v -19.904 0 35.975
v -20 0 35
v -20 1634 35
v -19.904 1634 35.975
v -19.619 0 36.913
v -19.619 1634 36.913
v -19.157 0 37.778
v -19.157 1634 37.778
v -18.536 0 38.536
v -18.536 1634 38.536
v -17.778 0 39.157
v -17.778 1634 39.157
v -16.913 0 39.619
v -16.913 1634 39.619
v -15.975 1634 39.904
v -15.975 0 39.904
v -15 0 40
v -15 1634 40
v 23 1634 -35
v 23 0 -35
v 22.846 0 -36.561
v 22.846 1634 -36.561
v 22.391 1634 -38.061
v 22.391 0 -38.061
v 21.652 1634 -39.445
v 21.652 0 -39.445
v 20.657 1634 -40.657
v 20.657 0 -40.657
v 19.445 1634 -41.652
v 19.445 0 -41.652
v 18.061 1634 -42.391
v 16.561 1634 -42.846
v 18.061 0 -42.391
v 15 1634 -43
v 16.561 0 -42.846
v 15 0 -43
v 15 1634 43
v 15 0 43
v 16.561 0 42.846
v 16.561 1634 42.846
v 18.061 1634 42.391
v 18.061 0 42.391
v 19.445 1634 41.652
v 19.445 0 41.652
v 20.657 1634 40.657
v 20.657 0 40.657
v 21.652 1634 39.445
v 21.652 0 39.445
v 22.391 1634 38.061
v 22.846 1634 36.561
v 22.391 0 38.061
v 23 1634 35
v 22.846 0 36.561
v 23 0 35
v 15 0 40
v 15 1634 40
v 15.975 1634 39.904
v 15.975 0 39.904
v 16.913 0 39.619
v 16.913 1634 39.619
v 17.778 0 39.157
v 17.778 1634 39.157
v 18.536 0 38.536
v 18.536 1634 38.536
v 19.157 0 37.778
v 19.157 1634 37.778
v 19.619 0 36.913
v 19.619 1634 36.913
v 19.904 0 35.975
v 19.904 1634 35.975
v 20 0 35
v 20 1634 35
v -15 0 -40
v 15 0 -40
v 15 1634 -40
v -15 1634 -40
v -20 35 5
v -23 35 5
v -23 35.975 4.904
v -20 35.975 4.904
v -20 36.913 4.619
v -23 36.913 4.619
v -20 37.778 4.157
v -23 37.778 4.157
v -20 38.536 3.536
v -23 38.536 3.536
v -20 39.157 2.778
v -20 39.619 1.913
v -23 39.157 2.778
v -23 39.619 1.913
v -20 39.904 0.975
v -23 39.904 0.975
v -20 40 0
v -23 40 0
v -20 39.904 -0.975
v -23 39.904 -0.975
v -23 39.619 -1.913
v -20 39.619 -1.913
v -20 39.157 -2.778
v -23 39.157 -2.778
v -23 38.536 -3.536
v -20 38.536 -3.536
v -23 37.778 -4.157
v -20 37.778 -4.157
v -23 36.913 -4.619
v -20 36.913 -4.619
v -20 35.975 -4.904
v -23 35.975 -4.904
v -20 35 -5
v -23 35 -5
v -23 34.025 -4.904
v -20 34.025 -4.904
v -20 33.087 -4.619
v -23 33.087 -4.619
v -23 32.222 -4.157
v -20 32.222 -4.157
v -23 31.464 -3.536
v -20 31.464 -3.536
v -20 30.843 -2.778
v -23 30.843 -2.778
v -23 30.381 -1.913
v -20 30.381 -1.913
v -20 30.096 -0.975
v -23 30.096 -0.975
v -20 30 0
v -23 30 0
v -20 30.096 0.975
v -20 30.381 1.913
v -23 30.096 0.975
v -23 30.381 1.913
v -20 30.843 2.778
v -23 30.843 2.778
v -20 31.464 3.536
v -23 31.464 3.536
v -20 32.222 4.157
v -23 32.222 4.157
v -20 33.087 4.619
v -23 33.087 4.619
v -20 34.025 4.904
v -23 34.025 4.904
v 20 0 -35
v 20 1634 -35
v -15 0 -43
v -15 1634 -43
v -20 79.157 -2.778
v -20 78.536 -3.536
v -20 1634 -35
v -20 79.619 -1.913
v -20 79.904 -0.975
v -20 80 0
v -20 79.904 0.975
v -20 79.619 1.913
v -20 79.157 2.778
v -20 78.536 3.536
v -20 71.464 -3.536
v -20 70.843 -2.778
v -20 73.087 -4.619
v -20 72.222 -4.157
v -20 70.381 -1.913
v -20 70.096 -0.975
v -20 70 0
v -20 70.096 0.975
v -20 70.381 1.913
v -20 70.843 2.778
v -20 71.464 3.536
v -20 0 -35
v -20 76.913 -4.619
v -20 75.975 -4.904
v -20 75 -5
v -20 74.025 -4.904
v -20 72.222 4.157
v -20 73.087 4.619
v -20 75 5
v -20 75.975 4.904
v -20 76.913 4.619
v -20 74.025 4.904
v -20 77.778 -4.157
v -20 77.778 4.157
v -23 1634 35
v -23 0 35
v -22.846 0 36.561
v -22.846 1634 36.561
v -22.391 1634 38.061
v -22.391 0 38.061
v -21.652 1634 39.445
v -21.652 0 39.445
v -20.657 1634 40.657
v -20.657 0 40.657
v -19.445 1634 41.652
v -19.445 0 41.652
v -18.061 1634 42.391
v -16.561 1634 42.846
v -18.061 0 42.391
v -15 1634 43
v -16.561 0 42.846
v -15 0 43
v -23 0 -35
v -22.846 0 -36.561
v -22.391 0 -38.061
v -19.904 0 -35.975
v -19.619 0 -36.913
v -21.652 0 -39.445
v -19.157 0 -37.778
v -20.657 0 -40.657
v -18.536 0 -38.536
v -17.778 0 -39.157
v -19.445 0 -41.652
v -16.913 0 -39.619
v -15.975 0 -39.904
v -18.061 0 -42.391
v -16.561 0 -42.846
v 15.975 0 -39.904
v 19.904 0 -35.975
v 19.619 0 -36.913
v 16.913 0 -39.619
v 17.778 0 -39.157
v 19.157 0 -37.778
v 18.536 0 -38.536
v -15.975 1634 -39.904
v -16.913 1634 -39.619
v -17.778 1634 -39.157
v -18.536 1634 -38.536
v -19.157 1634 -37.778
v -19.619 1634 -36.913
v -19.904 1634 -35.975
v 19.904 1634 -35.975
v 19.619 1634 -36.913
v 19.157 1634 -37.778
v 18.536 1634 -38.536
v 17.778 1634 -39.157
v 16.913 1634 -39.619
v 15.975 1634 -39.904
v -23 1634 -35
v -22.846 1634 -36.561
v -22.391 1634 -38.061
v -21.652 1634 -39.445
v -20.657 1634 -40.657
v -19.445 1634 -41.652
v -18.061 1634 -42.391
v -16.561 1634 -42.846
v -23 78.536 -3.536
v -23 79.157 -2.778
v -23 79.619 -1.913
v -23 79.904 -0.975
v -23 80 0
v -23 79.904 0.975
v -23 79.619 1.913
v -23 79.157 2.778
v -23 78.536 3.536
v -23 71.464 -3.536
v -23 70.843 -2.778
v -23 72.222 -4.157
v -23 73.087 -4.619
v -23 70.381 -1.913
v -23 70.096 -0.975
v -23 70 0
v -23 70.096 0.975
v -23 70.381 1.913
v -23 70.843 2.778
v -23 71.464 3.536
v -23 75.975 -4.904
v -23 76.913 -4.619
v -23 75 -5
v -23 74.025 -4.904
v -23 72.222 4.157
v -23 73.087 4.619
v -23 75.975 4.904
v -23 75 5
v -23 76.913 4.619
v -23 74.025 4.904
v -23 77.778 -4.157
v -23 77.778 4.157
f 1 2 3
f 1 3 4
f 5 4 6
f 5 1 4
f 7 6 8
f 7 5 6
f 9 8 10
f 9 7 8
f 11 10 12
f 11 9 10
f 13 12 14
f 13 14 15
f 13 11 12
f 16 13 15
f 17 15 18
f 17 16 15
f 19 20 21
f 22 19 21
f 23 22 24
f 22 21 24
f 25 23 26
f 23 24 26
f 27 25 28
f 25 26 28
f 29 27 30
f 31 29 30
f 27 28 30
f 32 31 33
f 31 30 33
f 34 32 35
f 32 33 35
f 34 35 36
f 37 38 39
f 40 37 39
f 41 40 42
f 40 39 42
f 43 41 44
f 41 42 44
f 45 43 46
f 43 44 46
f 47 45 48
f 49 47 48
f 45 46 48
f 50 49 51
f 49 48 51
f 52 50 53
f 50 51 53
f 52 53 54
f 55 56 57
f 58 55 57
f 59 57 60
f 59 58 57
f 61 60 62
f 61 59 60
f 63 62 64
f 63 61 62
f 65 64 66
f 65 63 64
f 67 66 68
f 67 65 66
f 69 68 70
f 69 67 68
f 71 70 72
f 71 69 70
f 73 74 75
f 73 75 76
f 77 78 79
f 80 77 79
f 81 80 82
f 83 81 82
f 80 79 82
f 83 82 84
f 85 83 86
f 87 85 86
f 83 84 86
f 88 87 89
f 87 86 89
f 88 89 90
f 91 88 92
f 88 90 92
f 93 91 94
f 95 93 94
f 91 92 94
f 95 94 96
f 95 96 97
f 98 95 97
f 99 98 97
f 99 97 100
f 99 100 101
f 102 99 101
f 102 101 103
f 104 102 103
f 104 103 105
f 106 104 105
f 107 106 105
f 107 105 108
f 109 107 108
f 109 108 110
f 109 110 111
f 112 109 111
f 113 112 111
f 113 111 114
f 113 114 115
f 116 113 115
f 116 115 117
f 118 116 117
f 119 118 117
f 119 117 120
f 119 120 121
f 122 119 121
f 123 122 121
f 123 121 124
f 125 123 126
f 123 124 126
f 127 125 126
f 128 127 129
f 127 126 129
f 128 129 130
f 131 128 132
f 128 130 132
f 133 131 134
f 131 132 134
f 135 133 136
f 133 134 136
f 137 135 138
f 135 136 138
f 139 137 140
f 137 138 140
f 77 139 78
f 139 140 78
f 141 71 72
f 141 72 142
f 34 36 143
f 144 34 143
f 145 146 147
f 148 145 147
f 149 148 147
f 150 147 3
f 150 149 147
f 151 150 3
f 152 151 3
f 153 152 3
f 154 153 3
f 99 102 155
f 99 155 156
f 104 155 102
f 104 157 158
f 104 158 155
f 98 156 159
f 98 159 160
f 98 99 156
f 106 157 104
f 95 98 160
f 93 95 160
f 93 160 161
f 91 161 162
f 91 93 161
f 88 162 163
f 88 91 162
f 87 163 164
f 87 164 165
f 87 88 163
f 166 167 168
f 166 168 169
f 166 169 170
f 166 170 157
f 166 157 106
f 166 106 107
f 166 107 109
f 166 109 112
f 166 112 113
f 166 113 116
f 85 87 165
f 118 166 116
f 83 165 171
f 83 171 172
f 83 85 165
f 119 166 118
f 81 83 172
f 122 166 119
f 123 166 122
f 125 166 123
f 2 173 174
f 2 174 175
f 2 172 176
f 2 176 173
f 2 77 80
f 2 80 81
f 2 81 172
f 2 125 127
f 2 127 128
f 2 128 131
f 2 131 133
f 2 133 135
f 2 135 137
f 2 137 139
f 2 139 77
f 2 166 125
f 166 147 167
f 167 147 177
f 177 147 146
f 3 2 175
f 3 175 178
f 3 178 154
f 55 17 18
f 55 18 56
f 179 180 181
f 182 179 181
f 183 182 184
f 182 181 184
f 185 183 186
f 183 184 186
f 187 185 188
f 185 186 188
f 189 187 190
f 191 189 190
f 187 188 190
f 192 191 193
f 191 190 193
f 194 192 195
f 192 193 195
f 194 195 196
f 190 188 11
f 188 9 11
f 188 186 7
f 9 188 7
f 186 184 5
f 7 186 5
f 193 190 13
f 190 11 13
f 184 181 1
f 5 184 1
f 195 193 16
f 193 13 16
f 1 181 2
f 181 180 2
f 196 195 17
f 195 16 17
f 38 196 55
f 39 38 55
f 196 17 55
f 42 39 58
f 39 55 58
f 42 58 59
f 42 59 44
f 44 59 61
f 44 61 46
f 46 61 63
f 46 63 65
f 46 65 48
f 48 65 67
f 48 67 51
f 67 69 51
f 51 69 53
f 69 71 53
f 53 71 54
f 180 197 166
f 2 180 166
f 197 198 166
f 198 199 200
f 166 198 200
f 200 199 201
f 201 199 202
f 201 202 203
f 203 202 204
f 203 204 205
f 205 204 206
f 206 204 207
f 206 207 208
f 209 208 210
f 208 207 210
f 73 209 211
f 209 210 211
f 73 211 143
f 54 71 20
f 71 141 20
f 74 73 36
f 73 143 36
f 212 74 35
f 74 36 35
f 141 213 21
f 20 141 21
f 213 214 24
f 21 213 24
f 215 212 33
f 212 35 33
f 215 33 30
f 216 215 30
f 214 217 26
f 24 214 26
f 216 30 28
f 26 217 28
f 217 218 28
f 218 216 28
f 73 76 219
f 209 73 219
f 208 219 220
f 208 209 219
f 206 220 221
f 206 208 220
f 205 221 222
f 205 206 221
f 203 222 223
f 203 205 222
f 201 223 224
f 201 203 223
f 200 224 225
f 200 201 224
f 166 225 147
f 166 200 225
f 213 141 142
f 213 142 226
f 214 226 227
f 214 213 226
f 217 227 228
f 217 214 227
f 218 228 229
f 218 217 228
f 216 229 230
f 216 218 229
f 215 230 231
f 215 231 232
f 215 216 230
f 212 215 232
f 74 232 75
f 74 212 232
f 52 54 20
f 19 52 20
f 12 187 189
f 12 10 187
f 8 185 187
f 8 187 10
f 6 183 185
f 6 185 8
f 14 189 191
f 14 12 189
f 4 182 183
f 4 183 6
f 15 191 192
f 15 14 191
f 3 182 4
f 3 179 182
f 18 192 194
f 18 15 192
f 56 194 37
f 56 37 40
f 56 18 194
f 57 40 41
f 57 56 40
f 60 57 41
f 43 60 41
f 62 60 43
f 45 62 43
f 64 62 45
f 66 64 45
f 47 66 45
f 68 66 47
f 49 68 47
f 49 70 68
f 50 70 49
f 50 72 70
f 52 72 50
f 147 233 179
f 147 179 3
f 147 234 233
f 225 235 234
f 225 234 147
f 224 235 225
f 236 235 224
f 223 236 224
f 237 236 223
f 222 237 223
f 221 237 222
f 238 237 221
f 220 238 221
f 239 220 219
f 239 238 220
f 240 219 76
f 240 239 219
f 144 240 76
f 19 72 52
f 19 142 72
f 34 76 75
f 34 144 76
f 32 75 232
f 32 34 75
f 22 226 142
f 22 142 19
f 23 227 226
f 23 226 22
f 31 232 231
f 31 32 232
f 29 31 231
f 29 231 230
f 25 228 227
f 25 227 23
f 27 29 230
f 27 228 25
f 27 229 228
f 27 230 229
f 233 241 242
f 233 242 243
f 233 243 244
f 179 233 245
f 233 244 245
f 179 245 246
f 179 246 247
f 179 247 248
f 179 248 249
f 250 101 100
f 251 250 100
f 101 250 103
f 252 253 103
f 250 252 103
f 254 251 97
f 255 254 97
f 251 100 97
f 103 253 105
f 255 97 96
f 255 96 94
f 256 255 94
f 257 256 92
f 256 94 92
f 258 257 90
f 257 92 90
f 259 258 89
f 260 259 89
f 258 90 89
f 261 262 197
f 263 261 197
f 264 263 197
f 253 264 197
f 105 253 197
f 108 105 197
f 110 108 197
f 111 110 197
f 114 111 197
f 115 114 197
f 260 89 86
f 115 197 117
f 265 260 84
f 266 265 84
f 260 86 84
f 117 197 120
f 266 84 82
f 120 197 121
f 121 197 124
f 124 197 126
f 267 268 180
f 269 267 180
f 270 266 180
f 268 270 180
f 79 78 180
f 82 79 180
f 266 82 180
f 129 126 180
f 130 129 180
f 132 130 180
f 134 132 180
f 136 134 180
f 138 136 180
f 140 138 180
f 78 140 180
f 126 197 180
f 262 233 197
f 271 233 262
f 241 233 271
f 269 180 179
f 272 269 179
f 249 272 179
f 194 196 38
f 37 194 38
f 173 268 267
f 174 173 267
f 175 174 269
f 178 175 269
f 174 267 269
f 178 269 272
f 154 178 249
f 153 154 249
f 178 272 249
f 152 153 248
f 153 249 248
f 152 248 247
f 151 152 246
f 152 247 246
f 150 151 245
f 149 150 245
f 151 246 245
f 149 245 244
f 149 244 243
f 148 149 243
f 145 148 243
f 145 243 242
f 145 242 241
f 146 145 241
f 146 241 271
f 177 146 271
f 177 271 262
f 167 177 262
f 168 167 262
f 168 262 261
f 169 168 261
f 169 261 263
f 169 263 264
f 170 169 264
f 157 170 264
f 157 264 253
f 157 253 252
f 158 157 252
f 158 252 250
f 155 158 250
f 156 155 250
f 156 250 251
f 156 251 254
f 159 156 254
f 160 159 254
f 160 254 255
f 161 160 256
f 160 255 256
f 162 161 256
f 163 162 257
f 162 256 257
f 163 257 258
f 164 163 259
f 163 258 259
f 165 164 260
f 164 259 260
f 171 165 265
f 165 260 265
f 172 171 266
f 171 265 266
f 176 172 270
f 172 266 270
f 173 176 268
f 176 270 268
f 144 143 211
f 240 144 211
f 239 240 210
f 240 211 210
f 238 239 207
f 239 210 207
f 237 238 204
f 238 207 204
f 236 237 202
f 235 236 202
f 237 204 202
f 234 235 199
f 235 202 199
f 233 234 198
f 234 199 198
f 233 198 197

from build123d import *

# Parameters (mm, degrees)
EXTRUDE_THIN1_DEPTH = 1634
CUT_EXTRUDE1_REACH  = 1637.213
SKETCH7_R           = 5


with BuildPart() as part:
    # Sketch6 → Extrude-Thin1 (new body)
    with BuildSketch(Plane(origin=(0, 0, 0), x_dir=(1, 0, 0), z_dir=(0, 1, 0))):
        with BuildLine():
            Line((-23, 35), (-23, -35))
            ThreePointArc((-23, -35), (-20.656854249, -40.656854249), (-15, -43))
            Line((-15, -43), (15, -43))
            ThreePointArc((15, -43), (20.656854249, -40.656854249), (23, -35))
            Line((23, -35), (23, 35))
            ThreePointArc((23, 35), (20.656854249, 40.656854249), (15, 43))
            Line((15, 43), (-15, 43))
            ThreePointArc((-15, 43), (-20.656854249, 40.656854249), (-23, 35))
        make_face()
        with BuildLine():
            Line((-20, 35), (-20, -35))
            ThreePointArc((-20, -35), (-18.535533906, -38.535533906), (-15, -40))
            Line((-15, -40), (15, -40))
            ThreePointArc((15, -40), (18.535533906, -38.535533906), (20, -35))
            Line((20, -35), (20, 35))
            ThreePointArc((20, 35), (18.535533906, 38.535533906), (15, 40))
            Line((15, 40), (-15, 40))
            ThreePointArc((-15, 40), (-18.535533906, 38.535533906), (-20, 35))
        make_face(mode=Mode.SUBTRACT)
    extrude(amount=EXTRUDE_THIN1_DEPTH)

    # Sketch7 → Cut-Extrude1 (cut, up to next)
    with BuildSketch(Plane.ZY.offset(23), mode=Mode.PRIVATE) as cut_extrude1_sk1:
        with Locations((0, 35)):
            Circle(SKETCH7_R)
    cut_extrude1_tool1 = extrude(cut_extrude1_sk1.sketch, amount=-CUT_EXTRUDE1_REACH, mode=Mode.PRIVATE) & part.part
    # Sketch7 → Cut-Extrude1 (cut, up to next)
    with BuildSketch(Plane.ZY.offset(23), mode=Mode.PRIVATE) as cut_extrude1_sk2:
        with Locations((0, 75)):
            Circle(SKETCH7_R)
    cut_extrude1_tool2 = extrude(cut_extrude1_sk2.sketch, amount=-CUT_EXTRUDE1_REACH, mode=Mode.PRIVATE) & part.part
    add(cut_extrude1_tool1.solids().sort_by_distance((-23, 35, 0))[0], mode=Mode.SUBTRACT)
    add(cut_extrude1_tool2.solids().sort_by_distance((-23, 75, 0))[0], mode=Mode.SUBTRACT)


solid = part.part
